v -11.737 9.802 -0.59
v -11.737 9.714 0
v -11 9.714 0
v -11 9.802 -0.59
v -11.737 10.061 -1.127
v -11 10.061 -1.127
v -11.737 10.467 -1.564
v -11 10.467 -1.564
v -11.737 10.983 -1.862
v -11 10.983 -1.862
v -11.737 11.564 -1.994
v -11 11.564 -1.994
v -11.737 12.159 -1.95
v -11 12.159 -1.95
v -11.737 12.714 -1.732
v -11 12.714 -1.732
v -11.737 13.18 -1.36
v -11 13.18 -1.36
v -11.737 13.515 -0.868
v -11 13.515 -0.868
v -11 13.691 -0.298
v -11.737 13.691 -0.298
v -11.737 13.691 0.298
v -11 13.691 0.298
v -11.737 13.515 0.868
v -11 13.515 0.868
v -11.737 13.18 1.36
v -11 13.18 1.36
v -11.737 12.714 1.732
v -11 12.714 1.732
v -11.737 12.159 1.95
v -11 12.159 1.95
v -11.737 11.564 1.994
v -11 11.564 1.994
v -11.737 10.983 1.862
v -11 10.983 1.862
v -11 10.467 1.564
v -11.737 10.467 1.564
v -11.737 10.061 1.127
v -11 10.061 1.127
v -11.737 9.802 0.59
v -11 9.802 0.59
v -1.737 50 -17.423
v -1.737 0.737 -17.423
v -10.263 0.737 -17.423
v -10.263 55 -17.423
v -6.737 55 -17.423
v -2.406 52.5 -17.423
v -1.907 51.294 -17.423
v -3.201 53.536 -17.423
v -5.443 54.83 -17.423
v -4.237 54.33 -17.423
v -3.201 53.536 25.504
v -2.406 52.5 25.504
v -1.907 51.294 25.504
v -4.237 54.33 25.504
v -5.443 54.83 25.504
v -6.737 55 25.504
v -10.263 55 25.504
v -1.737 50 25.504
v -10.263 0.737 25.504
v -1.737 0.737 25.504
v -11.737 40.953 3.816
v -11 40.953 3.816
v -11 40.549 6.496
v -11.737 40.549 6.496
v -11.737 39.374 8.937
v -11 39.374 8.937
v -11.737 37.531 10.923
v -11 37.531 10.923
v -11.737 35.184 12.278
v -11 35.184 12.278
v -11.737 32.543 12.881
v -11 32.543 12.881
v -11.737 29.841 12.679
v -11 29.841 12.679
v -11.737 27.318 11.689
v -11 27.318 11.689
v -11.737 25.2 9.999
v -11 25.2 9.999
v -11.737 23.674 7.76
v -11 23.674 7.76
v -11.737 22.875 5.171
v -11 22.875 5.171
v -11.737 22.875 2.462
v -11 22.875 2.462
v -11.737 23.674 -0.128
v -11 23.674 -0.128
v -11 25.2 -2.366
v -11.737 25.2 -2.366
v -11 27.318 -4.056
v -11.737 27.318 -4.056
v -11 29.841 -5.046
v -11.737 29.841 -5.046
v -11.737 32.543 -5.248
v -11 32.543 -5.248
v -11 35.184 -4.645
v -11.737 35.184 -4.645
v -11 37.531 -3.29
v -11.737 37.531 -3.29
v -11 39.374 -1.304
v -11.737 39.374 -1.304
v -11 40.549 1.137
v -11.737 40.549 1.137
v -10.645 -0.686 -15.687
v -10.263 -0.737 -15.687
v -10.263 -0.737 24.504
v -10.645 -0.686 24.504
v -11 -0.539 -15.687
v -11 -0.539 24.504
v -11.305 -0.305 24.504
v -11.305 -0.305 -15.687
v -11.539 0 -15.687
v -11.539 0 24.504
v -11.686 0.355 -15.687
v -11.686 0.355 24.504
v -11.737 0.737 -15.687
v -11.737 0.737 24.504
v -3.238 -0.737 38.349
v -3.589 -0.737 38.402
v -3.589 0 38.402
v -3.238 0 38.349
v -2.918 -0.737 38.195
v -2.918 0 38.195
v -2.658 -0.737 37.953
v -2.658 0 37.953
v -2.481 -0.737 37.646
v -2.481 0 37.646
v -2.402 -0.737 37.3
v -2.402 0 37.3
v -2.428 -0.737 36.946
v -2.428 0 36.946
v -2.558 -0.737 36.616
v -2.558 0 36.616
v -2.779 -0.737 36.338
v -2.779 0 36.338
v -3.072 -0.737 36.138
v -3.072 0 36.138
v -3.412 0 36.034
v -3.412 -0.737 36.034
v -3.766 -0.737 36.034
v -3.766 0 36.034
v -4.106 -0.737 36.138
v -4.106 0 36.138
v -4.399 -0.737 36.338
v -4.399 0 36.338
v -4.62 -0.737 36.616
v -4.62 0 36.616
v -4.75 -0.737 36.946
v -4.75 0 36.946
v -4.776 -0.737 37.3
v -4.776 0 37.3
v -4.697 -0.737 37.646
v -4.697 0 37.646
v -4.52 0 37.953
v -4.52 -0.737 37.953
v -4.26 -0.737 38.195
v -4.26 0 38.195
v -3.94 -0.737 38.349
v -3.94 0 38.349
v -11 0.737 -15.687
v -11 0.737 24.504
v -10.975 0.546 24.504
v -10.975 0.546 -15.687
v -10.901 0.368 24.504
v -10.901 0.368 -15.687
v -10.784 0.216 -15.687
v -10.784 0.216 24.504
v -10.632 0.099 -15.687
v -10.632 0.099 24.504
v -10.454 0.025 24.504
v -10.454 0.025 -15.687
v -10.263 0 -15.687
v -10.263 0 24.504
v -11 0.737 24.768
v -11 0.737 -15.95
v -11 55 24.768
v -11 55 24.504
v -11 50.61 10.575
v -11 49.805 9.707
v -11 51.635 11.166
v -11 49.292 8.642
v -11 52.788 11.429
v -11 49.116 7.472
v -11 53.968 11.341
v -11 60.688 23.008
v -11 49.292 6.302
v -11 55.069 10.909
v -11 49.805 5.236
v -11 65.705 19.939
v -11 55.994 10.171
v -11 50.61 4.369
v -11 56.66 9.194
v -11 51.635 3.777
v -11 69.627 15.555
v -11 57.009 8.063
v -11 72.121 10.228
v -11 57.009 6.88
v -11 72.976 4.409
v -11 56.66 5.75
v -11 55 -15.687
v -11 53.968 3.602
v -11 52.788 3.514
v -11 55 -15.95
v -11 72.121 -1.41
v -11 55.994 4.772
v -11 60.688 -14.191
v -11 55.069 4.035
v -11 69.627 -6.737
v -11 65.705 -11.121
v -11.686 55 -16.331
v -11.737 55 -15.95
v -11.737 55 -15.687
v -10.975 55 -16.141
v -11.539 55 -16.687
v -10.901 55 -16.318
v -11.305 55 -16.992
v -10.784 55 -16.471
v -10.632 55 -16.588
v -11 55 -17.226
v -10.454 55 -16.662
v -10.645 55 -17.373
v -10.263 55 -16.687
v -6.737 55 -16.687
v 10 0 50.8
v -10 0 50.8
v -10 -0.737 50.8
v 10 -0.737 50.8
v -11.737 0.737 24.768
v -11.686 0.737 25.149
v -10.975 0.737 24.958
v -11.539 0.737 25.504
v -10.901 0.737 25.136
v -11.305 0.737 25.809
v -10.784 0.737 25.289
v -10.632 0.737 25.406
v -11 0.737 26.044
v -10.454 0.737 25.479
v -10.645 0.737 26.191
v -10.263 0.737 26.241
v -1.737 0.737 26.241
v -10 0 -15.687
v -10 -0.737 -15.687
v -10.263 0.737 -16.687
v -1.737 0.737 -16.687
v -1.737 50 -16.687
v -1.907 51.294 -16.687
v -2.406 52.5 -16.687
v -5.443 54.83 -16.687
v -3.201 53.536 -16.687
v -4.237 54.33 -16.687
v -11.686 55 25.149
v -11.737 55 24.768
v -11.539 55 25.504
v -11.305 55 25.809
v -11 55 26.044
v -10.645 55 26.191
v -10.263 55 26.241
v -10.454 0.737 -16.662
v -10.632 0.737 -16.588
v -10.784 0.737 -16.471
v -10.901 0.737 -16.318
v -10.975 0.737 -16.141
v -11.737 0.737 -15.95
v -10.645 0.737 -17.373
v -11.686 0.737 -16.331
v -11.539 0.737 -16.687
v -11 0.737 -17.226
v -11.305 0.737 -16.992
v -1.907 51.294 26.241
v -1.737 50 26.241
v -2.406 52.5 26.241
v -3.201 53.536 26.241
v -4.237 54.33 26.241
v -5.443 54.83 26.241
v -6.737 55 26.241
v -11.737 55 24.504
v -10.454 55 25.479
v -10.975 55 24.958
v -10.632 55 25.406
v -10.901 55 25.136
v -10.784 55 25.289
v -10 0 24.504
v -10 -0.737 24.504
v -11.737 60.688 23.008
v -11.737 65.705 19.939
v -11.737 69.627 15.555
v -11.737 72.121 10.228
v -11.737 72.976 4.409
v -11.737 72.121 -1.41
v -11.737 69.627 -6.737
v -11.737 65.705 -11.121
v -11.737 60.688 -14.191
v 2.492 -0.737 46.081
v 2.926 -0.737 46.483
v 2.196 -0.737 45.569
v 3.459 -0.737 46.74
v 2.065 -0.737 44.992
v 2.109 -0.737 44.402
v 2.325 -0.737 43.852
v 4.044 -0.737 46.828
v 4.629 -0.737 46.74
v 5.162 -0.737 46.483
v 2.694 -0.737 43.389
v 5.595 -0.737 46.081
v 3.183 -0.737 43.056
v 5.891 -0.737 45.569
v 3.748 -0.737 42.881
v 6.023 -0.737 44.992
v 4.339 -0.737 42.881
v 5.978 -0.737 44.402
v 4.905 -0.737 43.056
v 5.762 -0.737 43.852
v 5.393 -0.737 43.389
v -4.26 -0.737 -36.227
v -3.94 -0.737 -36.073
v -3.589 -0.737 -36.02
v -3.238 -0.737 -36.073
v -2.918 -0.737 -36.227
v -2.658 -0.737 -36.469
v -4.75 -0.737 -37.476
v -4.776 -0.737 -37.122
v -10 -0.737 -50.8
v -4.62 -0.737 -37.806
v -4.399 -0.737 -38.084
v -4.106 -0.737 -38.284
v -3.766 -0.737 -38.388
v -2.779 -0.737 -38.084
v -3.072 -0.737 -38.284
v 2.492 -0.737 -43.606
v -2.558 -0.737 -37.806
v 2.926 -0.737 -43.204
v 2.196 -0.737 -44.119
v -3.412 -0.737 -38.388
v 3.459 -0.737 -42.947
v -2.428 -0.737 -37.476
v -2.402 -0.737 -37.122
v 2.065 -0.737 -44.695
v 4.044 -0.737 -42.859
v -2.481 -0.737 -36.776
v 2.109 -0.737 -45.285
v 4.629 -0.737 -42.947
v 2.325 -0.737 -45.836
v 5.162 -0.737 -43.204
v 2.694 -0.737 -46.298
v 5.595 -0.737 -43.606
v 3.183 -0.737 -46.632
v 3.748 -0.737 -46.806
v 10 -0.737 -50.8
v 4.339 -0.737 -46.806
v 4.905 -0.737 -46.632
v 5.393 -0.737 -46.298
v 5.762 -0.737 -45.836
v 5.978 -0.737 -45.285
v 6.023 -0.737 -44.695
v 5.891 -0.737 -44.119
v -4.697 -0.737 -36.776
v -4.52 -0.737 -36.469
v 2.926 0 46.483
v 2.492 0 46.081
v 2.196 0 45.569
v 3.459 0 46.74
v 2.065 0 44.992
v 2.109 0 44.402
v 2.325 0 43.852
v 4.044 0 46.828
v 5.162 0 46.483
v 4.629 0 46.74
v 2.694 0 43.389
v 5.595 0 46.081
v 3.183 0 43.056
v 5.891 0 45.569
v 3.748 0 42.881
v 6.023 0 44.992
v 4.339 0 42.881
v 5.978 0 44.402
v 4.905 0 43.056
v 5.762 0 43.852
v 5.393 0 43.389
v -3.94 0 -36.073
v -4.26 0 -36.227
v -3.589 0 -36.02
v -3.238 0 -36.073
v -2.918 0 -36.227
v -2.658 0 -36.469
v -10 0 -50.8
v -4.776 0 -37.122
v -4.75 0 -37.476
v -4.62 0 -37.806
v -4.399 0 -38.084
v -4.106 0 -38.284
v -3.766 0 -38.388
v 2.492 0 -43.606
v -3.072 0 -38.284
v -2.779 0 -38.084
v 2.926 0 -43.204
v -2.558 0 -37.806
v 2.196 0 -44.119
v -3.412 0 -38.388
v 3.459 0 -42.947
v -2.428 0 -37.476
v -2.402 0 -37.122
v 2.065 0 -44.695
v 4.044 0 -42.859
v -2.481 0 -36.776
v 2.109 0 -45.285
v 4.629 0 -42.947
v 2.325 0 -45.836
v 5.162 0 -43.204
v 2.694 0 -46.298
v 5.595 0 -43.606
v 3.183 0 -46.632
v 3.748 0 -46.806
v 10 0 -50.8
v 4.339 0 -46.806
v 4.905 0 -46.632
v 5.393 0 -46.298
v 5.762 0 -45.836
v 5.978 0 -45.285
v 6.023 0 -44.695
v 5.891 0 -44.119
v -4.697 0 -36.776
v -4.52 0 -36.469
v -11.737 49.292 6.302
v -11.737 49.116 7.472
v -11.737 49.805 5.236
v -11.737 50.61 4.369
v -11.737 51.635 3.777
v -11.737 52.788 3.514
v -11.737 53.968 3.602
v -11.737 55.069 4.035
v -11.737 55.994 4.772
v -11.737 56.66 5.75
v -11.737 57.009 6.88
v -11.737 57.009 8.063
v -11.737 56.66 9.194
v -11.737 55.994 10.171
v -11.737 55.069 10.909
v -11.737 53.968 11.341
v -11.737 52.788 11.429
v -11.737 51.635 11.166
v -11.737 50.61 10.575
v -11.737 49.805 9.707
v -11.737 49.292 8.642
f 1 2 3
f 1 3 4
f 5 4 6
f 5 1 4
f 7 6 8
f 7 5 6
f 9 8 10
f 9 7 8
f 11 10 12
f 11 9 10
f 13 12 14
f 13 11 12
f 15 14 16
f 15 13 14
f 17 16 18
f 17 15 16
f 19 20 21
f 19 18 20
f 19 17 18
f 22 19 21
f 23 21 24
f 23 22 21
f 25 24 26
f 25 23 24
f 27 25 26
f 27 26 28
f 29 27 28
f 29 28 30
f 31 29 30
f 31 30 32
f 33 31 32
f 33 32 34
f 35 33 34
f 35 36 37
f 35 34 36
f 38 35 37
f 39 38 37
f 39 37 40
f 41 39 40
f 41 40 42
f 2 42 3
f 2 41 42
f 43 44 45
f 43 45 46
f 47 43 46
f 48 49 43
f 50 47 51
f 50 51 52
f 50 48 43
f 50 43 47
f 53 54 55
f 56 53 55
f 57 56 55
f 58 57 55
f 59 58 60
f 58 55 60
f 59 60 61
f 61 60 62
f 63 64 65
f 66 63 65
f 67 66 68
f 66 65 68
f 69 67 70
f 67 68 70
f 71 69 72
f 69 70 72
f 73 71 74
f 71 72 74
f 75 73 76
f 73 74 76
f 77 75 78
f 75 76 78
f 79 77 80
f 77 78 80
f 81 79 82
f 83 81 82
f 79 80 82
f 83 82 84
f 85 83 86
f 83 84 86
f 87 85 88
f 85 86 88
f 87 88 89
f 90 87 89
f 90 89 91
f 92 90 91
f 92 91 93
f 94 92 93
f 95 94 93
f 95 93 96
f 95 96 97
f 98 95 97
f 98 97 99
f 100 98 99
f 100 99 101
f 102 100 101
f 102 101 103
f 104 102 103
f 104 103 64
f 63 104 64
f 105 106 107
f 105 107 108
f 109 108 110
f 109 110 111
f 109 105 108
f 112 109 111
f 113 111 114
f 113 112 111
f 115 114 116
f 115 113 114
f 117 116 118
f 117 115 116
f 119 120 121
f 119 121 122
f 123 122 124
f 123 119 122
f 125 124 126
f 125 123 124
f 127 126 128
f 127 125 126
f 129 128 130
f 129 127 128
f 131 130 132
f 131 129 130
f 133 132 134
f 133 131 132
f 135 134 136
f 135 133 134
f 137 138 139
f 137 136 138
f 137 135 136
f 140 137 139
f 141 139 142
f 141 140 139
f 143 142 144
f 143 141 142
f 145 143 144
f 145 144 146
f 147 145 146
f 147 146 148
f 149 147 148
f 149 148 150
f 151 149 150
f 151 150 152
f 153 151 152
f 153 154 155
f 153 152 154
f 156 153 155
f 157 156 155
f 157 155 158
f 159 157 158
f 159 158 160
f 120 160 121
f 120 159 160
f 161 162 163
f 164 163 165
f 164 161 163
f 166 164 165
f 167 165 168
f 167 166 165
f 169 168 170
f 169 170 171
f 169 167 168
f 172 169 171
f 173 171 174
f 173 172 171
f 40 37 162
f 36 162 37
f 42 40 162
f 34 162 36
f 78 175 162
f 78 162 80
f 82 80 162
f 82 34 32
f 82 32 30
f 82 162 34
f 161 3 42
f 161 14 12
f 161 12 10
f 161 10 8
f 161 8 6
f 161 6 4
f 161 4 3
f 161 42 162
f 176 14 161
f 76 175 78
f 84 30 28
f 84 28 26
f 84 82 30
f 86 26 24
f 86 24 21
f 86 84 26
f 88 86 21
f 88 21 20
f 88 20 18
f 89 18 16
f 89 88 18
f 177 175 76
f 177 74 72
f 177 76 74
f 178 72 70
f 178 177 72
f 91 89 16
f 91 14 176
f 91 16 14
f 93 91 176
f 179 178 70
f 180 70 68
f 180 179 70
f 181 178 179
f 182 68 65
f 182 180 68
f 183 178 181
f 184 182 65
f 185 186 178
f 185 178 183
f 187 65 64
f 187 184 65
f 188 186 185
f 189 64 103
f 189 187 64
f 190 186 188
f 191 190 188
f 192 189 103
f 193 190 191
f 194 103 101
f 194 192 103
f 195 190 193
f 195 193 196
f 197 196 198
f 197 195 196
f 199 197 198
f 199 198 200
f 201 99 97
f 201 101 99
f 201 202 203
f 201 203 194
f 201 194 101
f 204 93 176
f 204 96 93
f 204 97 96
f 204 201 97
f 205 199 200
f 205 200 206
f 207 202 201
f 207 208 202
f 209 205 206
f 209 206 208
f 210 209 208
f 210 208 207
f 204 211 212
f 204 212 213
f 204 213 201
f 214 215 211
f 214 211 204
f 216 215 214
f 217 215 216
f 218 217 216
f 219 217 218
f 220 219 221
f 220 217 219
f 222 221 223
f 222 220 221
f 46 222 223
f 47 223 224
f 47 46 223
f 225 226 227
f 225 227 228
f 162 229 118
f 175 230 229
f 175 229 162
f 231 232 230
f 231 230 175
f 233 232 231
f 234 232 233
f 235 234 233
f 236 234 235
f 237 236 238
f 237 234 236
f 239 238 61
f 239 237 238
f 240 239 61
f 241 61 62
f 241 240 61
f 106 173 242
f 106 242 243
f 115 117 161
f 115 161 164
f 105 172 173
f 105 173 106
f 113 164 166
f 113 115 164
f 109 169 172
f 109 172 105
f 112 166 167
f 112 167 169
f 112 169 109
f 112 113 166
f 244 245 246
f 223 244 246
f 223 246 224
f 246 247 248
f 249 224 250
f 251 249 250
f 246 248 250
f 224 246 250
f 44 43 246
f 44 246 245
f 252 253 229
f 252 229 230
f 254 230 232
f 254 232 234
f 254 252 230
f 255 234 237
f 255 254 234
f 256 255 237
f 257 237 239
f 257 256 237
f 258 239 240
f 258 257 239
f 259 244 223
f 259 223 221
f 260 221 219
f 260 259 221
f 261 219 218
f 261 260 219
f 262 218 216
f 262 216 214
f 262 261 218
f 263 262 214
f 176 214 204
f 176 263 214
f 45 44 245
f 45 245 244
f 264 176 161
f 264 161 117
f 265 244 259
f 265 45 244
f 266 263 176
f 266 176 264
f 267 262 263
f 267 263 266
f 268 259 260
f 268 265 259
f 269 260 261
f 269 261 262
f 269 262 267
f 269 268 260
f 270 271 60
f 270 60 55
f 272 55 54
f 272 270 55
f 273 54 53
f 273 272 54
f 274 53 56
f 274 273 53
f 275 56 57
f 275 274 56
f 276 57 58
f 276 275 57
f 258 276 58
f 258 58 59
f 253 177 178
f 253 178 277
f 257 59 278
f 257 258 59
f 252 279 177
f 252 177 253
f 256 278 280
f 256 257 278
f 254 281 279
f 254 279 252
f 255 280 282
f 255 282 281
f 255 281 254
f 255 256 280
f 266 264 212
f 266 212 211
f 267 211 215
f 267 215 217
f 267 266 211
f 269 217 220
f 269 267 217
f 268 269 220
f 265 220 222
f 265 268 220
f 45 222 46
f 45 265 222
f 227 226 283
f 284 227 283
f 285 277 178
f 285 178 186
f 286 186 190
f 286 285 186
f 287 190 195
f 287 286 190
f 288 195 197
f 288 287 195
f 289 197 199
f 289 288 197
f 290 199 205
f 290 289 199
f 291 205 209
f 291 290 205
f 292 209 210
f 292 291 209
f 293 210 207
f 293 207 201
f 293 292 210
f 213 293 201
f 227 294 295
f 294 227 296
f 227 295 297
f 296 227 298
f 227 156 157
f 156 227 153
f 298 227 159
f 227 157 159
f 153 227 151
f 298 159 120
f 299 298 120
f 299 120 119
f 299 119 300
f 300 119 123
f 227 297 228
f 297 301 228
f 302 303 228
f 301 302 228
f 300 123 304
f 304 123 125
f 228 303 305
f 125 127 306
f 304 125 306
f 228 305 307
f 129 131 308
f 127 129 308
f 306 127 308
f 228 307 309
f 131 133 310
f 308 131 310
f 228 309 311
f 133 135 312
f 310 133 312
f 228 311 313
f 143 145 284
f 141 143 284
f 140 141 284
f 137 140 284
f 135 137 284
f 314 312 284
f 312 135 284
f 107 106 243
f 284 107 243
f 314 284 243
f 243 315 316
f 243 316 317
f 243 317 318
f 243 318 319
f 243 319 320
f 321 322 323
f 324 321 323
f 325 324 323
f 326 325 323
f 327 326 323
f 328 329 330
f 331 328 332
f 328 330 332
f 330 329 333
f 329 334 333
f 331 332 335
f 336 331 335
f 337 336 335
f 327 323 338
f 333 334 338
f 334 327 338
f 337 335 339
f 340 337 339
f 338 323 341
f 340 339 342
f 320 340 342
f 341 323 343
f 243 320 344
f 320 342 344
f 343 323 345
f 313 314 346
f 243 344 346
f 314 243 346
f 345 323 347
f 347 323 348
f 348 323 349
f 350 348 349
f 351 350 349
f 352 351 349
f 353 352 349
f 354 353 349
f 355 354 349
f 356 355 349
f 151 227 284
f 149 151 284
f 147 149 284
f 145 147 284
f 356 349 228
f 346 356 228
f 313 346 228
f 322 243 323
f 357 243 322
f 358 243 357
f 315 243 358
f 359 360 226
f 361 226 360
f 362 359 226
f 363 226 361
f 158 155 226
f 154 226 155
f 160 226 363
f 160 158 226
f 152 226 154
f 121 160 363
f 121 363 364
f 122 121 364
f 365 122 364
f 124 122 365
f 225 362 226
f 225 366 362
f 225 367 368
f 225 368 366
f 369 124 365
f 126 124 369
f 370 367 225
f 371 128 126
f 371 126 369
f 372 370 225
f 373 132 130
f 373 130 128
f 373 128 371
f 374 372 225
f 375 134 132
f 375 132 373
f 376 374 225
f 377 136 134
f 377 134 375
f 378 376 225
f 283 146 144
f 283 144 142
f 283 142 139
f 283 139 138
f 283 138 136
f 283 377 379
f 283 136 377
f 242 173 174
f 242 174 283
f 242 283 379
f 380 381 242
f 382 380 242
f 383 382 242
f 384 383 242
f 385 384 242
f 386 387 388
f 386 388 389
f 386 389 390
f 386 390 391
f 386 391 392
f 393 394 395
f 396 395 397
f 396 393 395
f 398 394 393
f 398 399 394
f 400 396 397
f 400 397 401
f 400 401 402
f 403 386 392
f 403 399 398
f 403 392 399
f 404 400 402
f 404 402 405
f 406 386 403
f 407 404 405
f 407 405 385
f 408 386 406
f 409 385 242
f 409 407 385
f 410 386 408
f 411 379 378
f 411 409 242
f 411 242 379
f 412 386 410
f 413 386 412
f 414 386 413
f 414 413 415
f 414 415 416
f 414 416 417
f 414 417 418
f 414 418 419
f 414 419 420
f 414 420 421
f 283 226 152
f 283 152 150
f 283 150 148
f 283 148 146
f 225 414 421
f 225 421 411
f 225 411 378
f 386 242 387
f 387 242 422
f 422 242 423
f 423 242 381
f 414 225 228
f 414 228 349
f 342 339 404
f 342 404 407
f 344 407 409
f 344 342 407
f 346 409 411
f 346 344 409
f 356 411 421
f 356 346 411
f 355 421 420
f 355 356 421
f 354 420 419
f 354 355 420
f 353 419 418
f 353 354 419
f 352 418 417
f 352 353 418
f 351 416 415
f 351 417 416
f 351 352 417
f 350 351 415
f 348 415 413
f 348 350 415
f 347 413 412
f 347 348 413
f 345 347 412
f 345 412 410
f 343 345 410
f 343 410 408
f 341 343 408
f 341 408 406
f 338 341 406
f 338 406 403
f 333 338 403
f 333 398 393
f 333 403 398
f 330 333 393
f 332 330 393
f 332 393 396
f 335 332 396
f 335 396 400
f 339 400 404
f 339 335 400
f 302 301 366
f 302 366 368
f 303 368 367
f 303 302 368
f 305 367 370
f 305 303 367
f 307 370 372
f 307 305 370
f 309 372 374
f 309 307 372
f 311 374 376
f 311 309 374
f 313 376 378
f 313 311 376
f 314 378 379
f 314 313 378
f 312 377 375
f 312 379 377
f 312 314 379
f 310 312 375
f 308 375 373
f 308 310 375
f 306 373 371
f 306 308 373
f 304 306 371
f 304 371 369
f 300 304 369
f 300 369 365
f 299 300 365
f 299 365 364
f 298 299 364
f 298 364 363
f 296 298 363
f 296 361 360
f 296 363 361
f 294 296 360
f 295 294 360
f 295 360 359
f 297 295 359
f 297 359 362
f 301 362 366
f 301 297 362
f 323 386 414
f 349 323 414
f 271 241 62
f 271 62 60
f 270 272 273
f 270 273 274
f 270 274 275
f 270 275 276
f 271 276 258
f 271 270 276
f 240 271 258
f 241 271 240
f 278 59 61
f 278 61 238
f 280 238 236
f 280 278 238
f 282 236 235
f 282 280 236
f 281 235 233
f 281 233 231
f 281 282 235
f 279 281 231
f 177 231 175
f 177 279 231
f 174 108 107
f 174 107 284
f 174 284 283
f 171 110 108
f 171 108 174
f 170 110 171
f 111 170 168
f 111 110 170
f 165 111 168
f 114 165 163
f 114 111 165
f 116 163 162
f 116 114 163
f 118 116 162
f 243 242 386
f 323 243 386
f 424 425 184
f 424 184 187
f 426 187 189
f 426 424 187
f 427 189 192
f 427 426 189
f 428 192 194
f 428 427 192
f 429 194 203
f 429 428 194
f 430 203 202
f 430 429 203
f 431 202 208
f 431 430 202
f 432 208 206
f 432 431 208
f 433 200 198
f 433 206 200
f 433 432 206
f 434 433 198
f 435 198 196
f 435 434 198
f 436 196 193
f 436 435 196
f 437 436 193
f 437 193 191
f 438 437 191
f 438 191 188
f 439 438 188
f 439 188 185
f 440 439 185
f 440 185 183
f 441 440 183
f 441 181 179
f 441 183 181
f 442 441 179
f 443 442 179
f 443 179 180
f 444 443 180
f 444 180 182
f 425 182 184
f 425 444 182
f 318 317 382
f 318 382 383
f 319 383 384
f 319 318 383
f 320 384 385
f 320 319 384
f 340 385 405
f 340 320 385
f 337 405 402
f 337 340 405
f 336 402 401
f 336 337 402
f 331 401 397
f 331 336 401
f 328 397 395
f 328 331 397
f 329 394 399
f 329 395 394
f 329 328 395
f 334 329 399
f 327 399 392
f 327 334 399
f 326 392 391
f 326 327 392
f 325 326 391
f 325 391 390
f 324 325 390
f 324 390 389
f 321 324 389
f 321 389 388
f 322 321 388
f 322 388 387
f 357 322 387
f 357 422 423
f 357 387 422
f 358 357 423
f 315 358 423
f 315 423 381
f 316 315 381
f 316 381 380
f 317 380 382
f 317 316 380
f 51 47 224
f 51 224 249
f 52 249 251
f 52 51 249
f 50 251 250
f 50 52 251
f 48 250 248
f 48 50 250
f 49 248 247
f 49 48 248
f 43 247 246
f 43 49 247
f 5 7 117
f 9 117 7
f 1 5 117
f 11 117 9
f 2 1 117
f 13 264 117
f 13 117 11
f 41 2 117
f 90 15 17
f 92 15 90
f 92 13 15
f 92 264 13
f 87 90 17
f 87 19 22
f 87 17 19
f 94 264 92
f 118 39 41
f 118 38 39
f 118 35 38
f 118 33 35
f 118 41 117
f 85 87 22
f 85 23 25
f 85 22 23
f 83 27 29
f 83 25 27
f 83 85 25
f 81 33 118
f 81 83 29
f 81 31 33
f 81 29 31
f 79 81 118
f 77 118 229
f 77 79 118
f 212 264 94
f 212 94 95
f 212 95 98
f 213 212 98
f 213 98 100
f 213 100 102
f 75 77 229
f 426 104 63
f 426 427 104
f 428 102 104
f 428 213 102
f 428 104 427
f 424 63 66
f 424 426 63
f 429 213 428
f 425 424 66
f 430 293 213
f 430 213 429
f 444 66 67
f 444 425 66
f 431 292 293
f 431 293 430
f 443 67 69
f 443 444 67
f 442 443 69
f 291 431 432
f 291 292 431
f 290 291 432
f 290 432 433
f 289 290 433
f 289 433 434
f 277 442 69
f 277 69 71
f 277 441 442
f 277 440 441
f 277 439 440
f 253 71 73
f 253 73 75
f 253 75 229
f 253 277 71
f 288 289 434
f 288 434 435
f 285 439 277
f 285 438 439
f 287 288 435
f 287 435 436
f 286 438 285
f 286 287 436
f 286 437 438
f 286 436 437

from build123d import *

# Parameters (mm, degrees)
SKETCH1_W                 = 20
SKETCH1_H                 = 101.6
BASE_FLANGE1_DEPTH        = 0.7366
EDGE_FLANGE1_DEPTH        = 40.191036667
EDGE_FLANGE1_START        = 0.7366
EDGE_FLANGE1_FLAT_DEPTH   = 0.7366
CUT_EXTRUDE1_DEPTH        = 235.985755194
CUT_EXTRUDE1_DEPTH_BACK   = 235.985755194
SKETCH9_R                 = 2
CUT_EXTRUDE3_DEPTH        = 238.044873218
CUT_EXTRUDE3_DEPTH_BACK   = 238.044873218
SKETCH11_R                = 3.96875
CUT_EXTRUDE5_DEPTH        = 196.726274862
CUT_EXTRUDE5_DEPTH_BACK   = 196.726274862
SKETCH13_R                = 1.984375
SKETCH13_R_2              = 1.190625
EDGE_FLANGE2_DEPTH        = 54.2634
EDGE_FLANGE2_START        = 0.7366
EDGE_FLANGE2_FLAT_DEPTH   = 0.7366
EDGE_FLANGE2_BEND_DEPTH   = 54.2634
EDGE_FLANGE2_FLAT_2_DEPTH = 0.7366
SKETCH30_R                = 9.089973339
CUT_EXTRUDE15_DEPTH       = 10


# Sheet-metal steps are written as plain solids
with BuildPart() as part:
    # Sketch1 → Base-Flange1 (new body)
    with BuildSketch(Plane(origin=(0, 0, 0), x_dir=(1, 0, 0), z_dir=(0, 1, 0))):
        Rectangle(SKETCH1_W, SKETCH1_H)
    extrude(amount=-BASE_FLANGE1_DEPTH)

    # Edge-Flange1 bend section (across the edge) → Edge-Flange1 (add)
    with BuildSketch(Plane(origin=(-11, 0, -15.686713846), x_dir=(1, 0, 0), z_dir=(0, 0, 1))):
        with BuildLine():
            Line((-0.7366, 0.7366), (0, 0.7366))
            ThreePointArc((0, 0.7366), (0.215745145, 0.215745145), (0.7366, 0))
            Line((0.7366, 0), (1, 0))
            Line((1, 0), (1, -0.7366))
            Line((1, -0.7366), (0.7366, -0.7366))
            ThreePointArc((0.7366, -0.7366), (-0.30510971, -0.30510971), (-0.7366, 0.7366))
        make_face()
    extrude(amount=EDGE_FLANGE1_DEPTH)

    # Edge-Flange1 profile (on flange) → Edge-Flange1 flat (add)
    with BuildSketch(Plane.ZY.offset(11).offset(EDGE_FLANGE1_START)):
        with BuildLine():
            ThreePointArc((24.504322822, 55), (4.408804488, 72.976240445), (-15.686713846, 55))
            Line((-15.686713846, 55), (-15.686713846, 0.7366))
            Line((-15.686713846, 0.7366), (24.504322822, 0.7366))
            Line((24.504322822, 0.7366), (24.504322822, 55))
        make_face()
    extrude(amount=-EDGE_FLANGE1_FLAT_DEPTH)

    # Sketch9 → Cut-Extrude1 (cut, two sides: drawn at the far end of the back side and taken through both)
    with BuildSketch(Plane(origin=(-32.365, -124.793980752, 68.826299478), x_dir=(0, 0, -1), z_dir=(1, 0, 0)).offset(-CUT_EXTRUDE1_DEPTH_BACK)):
        with Locations(Location((68.826299478, 136.507533033, 0), (0, 0, 270))):
            Circle(SKETCH9_R)
    extrude(amount=CUT_EXTRUDE1_DEPTH + CUT_EXTRUDE1_DEPTH_BACK, mode=Mode.SUBTRACT)

    # Sketch11 → Cut-Extrude3 (cut, two sides: drawn at the far end of the back side and taken through both)
    with BuildSketch(Plane(origin=(-42.6, -124.793980752, 68.826299478), x_dir=(0, 0, -1), z_dir=(1, 0, 0)).offset(-CUT_EXTRUDE3_DEPTH_BACK)):
        with Locations(Location((61.354566786, 177.878571708, 0), (0, 0, 270))):
            Circle(SKETCH11_R)
    extrude(amount=CUT_EXTRUDE3_DEPTH + CUT_EXTRUDE3_DEPTH_BACK, mode=Mode.SUBTRACT)

    # Sketch13 → Cut-Extrude5 (cut, two sides: drawn at the far end of the back side and taken through both)
    with BuildSketch(Plane(origin=(124.911822879, 0, 68.826299478), x_dir=(-0.7071067811865436, 0, 0.7071067811865515), z_dir=(0, 1, 0)).offset(-CUT_EXTRUDE5_DEPTH_BACK)):
        with Locations(Location((68.508410595, -102.424928038, 0), (0, 0, 45))):
            Circle(SKETCH13_R)
        with Locations(Location((68.508410595, -113.219195896, 0), (0, 0, 45))):
            Circle(SKETCH13_R_2)
        with Locations(Location((5.089841868, -165.843496765, 0), (0, 0, 45))):
            Circle(SKETCH13_R)
        with Locations(Location((15.884109726, -165.843496765, 0), (0, 0, 45))):
            Circle(SKETCH13_R_2)
    extrude(amount=CUT_EXTRUDE5_DEPTH + CUT_EXTRUDE5_DEPTH_BACK, mode=Mode.SUBTRACT)

    # Edge-Flange2 bend section (across the edge) → Edge-Flange2 (add)
    with BuildSketch(Plane(origin=(-11, 0.7366, -16.686713846), x_dir=(0, 0, 1), z_dir=(0, 1, 0))):
        with BuildLine():
            Line((-0.7366, 0.7366), (0, 0.7366))
            ThreePointArc((0, 0.7366), (0.215745145, 0.215745145), (0.7366, 0))
            Line((0.7366, 0), (1, 0))
            Line((1, 0), (1, -0.7366))
            Line((1, -0.7366), (0.7366, -0.7366))
            ThreePointArc((0.7366, -0.7366), (-0.30510971, -0.30510971), (-0.7366, 0.7366))
        make_face()
    extrude(amount=EDGE_FLANGE2_DEPTH)

    # Edge-Flange2 profile (on flange) → Edge-Flange2 flat (add)
    with BuildSketch(Plane(origin=(-11, 0, -16.686713846), x_dir=(0, 1, 0), z_dir=(0, 0, -1)).offset(EDGE_FLANGE2_START)):
        with BuildLine():
            Line((50, 9.2634), (0.7366, 9.2634))
            Line((0.7366, 9.2634), (0.7366, 0.7366))
            Line((0.7366, 0.7366), (55, 0.7366))
            Line((55, 0.7366), (55, 4.2634))
            ThreePointArc((55, 4.2634), (53.535533906, 7.798933906), (50, 9.2634))
        make_face()
    extrude(amount=-EDGE_FLANGE2_FLAT_DEPTH)

    # Edge-Flange2 bend section 2 (across the edge) → Edge-Flange2 bend (add)
    with BuildSketch(Plane(origin=(-11, 55, 25.504322822), x_dir=(0, 0, -1), z_dir=(0, -1, 0))):
        with BuildLine():
            Line((-0.7366, 0.7366), (0, 0.7366))
            ThreePointArc((0, 0.7366), (0.215745145, 0.215745145), (0.7366, 0))
            Line((0.7366, 0), (1, 0))
            Line((1, 0), (1, -0.7366))
            Line((1, -0.7366), (0.7366, -0.7366))
            ThreePointArc((0.7366, -0.7366), (-0.30510971, -0.30510971), (-0.7366, 0.7366))
        make_face()
    extrude(amount=EDGE_FLANGE2_BEND_DEPTH)

    # Edge-Flange2 profile 2 (on flange) → Edge-Flange2 flat 2 (add)
    with BuildSketch(Plane(origin=(-11, 0, 25.504322822), x_dir=(0, -1, 0), z_dir=(0, 0, 1)).offset(EDGE_FLANGE2_START)):
        with BuildLine():
            ThreePointArc((-50, 9.2634), (-53.535533906, 7.798933906), (-55, 4.2634))
            Line((-55, 4.2634), (-55, 0.7366))
            Line((-55, 0.7366), (-0.7366, 0.7366))
            Line((-0.7366, 0.7366), (-0.7366, 9.2634))
            Line((-0.7366, 9.2634), (-50, 9.2634))
        make_face()
    extrude(amount=-EDGE_FLANGE2_FLAT_2_DEPTH)

    # Sketch30 → Cut-Extrude15 (cut)
    with BuildSketch(Plane(origin=(-11, 0, 0), x_dir=(0, 0, -1), z_dir=(1, 0, 0))):
        with Locations(Location((-3.816431775, 31.863348386, 0), (0, 0, 90))):
            Circle(SKETCH30_R)
    extrude(amount=-CUT_EXTRUDE15_DEPTH, mode=Mode.SUBTRACT)


solid = part.part
